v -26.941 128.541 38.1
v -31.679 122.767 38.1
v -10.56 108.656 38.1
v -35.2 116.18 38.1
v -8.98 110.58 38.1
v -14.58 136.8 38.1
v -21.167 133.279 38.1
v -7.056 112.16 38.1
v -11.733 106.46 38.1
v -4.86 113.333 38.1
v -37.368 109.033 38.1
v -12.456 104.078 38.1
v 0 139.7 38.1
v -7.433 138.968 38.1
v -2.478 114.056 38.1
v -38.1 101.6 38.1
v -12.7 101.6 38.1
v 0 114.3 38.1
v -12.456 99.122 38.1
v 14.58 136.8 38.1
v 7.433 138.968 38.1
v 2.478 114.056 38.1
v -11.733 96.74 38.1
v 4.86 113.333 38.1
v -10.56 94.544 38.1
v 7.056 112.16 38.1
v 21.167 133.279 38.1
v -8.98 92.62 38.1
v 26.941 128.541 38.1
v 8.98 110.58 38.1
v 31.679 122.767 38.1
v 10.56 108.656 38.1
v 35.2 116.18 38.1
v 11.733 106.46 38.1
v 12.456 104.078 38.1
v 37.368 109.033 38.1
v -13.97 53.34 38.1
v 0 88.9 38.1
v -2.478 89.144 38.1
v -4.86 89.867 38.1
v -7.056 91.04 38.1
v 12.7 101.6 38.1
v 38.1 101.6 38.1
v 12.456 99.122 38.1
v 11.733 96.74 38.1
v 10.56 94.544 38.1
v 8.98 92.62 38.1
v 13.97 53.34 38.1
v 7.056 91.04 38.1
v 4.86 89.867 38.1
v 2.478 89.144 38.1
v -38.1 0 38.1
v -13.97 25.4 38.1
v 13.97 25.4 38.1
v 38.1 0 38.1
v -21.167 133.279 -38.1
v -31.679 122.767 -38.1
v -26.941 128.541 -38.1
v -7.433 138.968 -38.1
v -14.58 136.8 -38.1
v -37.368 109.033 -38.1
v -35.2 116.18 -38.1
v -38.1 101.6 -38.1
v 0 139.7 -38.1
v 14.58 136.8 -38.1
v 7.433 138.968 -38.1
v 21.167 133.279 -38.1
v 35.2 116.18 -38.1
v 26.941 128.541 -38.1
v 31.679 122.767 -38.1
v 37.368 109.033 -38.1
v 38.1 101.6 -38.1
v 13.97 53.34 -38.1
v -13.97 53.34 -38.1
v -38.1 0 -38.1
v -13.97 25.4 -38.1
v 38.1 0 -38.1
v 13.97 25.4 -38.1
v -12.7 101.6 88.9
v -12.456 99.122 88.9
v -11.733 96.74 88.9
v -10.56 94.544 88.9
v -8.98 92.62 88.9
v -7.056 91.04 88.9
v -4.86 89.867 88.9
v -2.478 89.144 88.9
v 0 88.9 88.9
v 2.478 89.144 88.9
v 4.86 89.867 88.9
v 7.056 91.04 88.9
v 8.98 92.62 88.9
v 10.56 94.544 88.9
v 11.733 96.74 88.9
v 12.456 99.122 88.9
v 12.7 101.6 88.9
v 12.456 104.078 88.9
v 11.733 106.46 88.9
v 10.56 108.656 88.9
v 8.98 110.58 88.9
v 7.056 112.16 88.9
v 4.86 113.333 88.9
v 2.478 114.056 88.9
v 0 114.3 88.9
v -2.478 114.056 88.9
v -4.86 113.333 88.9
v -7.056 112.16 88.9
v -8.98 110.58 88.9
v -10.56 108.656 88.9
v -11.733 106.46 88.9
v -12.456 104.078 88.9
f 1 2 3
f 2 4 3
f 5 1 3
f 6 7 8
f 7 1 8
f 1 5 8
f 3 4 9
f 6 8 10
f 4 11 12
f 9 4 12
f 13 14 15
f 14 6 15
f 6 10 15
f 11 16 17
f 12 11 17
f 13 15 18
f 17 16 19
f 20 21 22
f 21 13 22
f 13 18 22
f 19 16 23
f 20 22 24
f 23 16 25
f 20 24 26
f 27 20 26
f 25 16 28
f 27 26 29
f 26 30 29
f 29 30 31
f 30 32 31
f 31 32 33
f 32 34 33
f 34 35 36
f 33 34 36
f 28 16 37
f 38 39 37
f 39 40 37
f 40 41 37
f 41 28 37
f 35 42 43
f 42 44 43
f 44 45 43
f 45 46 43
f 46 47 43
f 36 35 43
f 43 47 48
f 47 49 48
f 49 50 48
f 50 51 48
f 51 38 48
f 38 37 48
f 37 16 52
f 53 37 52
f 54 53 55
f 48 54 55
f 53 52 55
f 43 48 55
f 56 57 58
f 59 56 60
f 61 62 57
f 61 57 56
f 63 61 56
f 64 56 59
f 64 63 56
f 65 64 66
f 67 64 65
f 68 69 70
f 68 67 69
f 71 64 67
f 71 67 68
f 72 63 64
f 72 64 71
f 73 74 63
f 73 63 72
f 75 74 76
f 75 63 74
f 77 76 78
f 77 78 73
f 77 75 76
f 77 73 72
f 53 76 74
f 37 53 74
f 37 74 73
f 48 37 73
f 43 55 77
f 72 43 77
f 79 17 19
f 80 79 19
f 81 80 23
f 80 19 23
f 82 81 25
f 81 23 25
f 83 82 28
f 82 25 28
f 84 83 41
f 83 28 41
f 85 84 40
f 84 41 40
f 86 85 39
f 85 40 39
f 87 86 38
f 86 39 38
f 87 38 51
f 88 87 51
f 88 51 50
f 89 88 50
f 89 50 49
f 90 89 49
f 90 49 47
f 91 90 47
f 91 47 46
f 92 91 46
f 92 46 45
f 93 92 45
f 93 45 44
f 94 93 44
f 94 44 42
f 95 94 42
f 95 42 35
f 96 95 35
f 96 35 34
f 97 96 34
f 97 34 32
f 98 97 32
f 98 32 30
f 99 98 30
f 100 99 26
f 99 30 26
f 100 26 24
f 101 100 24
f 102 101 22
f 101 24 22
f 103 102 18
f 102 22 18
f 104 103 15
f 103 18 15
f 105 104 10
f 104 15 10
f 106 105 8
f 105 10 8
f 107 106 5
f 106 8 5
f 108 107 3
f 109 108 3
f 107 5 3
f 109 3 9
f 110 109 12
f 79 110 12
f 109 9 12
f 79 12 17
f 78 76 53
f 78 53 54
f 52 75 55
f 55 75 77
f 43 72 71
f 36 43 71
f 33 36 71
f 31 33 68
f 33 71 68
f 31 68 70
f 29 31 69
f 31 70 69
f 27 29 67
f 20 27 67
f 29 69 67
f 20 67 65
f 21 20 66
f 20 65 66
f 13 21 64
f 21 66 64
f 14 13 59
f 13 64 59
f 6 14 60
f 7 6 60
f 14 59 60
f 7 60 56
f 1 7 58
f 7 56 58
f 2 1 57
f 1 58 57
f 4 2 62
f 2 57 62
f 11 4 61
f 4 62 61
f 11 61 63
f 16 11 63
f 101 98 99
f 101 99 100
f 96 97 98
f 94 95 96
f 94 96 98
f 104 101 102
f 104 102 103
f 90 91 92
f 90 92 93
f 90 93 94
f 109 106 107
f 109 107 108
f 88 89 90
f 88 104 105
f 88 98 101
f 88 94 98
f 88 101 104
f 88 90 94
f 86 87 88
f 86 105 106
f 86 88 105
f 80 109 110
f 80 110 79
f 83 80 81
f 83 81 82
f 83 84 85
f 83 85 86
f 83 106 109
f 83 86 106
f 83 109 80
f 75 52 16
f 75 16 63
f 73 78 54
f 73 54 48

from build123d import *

# Parameters (mm, degrees)
SKETCH1_W                = 76.2
SKETCH1_H                = 76.2
BOSS_EXTRUDE1_DEPTH      = 101.6
BOSS_EXTRUDE2_DEPTH      = 38.1
BOSS_EXTRUDE2_DEPTH_BACK = 38.1
SKETCH2_R                = 38.1
CUT_EXTRUDE1_DEPTH       = 150.730791756
CUT_EXTRUDE1_DEPTH_BACK  = 150.730791756
SKETCH3_W                = 27.94
SKETCH3_H                = 27.94
SKETCH4_R                = 12.7
BOSS_EXTRUDE3_DEPTH      = 88.9


with BuildPart() as part:
    # Sketch1 → Boss-Extrude1 (new body)
    with BuildSketch(Plane(origin=(0, 0, 0), x_dir=(1, 0, 0), z_dir=(0, 1, 0))):
        Rectangle(SKETCH1_W, SKETCH1_H)
    extrude(amount=BOSS_EXTRUDE1_DEPTH)

    # Sketch2 → Boss-Extrude2 (add, two sides: drawn at the far end of the back side and taken through both)
    with BuildSketch(Plane.XY.offset(-BOSS_EXTRUDE2_DEPTH_BACK)):
        with Locations((0, 101.6)):
            Circle(SKETCH2_R)
    extrude(amount=BOSS_EXTRUDE2_DEPTH + BOSS_EXTRUDE2_DEPTH_BACK)

    # Sketch3 → Cut-Extrude1 (cut, two sides: drawn at the far end of the back side and taken through both)
    with BuildSketch(Plane.XY.offset(-CUT_EXTRUDE1_DEPTH_BACK)):
        with Locations((0, 39.37)):
            Rectangle(SKETCH3_W, SKETCH3_H)
    extrude(amount=CUT_EXTRUDE1_DEPTH + CUT_EXTRUDE1_DEPTH_BACK, mode=Mode.SUBTRACT)

    # Sketch4 → Boss-Extrude3 (add)
    with BuildSketch(Plane.XY):
        with Locations(Location((0, 101.6, 0), (0, 0, 180))):
            Circle(SKETCH4_R)
    extrude(amount=BOSS_EXTRUDE3_DEPTH)


solid = part.part
